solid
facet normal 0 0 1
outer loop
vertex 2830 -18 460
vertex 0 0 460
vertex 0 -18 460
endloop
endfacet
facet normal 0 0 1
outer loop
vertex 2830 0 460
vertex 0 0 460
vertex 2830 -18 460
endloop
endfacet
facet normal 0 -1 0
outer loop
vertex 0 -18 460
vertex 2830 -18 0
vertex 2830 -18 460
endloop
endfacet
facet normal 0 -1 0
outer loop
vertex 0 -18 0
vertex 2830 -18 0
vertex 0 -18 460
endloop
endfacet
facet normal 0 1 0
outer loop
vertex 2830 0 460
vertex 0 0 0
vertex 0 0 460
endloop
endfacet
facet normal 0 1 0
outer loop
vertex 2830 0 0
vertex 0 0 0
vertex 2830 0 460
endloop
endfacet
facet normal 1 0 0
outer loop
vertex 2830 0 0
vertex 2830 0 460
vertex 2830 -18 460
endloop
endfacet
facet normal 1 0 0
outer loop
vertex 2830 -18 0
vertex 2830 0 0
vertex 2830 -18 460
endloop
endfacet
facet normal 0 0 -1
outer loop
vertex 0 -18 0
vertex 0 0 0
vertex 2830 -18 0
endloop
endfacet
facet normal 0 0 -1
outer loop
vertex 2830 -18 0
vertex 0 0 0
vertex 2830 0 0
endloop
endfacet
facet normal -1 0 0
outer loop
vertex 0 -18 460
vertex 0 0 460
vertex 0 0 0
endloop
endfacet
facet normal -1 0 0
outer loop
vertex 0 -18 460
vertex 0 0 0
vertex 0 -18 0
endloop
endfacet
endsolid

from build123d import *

# Parameters (mm, degrees)
F0_W     = 47.8422194719
F0_H     = 47.8707104921
F1_DEPTH = 18
F2_DEPTH = 2830
F3_DEPTH = 500
F4_DEPTH = 50
F5_DEPTH = 50
F6_DEPTH = 20
F7_DEPTH = 10


with BuildPart() as f1:
    # F0 (on Front) → F1 (new body)
    with BuildSketch(Plane.XZ):
        with Locations((23.921109736, 23.9353552461)):
            Rectangle(F0_W, F0_H)
    extrude(amount=F1_DEPTH)

    # F2 (add): a face of the model
    f2_faces = [f1.faces().sort_by_distance(p)[0] for p in [
        (0, -9, 23.9353552461),
    ]]
    extrude(f2_faces, amount=-F2_DEPTH)

    # F3 (add): a face of the model
    f3_faces = [f1.faces().sort_by_distance(p)[0] for p in [
        (1415, -9, 0),
    ]]
    extrude(f3_faces, amount=-F3_DEPTH)

    # F4 (add): a face of the model
    f4_faces = [f1.faces().sort_by_distance(p)[0] for p in [
        (1415, -9, 500),
    ]]
    extrude(f4_faces, amount=-F4_DEPTH)

    # F5 (cut): a face of the model
    f5_faces = [f1.faces().sort_by_distance(p)[0] for p in [
        (1415, -9, 500),
    ]]
    extrude(f5_faces, amount=-F5_DEPTH, mode=Mode.SUBTRACT)

    # F6 (add): a face of the model
    f6_faces = [f1.faces().sort_by_distance(p)[0] for p in [
        (1415, -9, 450),
    ]]
    extrude(f6_faces, amount=F6_DEPTH)

    # F7 (cut): a face of the model
    f7_faces = [f1.faces().sort_by_distance(p)[0] for p in [
        (1415, -9, 470),
    ]]
    extrude(f7_faces, amount=-F7_DEPTH, mode=Mode.SUBTRACT)


solid = f1.part
